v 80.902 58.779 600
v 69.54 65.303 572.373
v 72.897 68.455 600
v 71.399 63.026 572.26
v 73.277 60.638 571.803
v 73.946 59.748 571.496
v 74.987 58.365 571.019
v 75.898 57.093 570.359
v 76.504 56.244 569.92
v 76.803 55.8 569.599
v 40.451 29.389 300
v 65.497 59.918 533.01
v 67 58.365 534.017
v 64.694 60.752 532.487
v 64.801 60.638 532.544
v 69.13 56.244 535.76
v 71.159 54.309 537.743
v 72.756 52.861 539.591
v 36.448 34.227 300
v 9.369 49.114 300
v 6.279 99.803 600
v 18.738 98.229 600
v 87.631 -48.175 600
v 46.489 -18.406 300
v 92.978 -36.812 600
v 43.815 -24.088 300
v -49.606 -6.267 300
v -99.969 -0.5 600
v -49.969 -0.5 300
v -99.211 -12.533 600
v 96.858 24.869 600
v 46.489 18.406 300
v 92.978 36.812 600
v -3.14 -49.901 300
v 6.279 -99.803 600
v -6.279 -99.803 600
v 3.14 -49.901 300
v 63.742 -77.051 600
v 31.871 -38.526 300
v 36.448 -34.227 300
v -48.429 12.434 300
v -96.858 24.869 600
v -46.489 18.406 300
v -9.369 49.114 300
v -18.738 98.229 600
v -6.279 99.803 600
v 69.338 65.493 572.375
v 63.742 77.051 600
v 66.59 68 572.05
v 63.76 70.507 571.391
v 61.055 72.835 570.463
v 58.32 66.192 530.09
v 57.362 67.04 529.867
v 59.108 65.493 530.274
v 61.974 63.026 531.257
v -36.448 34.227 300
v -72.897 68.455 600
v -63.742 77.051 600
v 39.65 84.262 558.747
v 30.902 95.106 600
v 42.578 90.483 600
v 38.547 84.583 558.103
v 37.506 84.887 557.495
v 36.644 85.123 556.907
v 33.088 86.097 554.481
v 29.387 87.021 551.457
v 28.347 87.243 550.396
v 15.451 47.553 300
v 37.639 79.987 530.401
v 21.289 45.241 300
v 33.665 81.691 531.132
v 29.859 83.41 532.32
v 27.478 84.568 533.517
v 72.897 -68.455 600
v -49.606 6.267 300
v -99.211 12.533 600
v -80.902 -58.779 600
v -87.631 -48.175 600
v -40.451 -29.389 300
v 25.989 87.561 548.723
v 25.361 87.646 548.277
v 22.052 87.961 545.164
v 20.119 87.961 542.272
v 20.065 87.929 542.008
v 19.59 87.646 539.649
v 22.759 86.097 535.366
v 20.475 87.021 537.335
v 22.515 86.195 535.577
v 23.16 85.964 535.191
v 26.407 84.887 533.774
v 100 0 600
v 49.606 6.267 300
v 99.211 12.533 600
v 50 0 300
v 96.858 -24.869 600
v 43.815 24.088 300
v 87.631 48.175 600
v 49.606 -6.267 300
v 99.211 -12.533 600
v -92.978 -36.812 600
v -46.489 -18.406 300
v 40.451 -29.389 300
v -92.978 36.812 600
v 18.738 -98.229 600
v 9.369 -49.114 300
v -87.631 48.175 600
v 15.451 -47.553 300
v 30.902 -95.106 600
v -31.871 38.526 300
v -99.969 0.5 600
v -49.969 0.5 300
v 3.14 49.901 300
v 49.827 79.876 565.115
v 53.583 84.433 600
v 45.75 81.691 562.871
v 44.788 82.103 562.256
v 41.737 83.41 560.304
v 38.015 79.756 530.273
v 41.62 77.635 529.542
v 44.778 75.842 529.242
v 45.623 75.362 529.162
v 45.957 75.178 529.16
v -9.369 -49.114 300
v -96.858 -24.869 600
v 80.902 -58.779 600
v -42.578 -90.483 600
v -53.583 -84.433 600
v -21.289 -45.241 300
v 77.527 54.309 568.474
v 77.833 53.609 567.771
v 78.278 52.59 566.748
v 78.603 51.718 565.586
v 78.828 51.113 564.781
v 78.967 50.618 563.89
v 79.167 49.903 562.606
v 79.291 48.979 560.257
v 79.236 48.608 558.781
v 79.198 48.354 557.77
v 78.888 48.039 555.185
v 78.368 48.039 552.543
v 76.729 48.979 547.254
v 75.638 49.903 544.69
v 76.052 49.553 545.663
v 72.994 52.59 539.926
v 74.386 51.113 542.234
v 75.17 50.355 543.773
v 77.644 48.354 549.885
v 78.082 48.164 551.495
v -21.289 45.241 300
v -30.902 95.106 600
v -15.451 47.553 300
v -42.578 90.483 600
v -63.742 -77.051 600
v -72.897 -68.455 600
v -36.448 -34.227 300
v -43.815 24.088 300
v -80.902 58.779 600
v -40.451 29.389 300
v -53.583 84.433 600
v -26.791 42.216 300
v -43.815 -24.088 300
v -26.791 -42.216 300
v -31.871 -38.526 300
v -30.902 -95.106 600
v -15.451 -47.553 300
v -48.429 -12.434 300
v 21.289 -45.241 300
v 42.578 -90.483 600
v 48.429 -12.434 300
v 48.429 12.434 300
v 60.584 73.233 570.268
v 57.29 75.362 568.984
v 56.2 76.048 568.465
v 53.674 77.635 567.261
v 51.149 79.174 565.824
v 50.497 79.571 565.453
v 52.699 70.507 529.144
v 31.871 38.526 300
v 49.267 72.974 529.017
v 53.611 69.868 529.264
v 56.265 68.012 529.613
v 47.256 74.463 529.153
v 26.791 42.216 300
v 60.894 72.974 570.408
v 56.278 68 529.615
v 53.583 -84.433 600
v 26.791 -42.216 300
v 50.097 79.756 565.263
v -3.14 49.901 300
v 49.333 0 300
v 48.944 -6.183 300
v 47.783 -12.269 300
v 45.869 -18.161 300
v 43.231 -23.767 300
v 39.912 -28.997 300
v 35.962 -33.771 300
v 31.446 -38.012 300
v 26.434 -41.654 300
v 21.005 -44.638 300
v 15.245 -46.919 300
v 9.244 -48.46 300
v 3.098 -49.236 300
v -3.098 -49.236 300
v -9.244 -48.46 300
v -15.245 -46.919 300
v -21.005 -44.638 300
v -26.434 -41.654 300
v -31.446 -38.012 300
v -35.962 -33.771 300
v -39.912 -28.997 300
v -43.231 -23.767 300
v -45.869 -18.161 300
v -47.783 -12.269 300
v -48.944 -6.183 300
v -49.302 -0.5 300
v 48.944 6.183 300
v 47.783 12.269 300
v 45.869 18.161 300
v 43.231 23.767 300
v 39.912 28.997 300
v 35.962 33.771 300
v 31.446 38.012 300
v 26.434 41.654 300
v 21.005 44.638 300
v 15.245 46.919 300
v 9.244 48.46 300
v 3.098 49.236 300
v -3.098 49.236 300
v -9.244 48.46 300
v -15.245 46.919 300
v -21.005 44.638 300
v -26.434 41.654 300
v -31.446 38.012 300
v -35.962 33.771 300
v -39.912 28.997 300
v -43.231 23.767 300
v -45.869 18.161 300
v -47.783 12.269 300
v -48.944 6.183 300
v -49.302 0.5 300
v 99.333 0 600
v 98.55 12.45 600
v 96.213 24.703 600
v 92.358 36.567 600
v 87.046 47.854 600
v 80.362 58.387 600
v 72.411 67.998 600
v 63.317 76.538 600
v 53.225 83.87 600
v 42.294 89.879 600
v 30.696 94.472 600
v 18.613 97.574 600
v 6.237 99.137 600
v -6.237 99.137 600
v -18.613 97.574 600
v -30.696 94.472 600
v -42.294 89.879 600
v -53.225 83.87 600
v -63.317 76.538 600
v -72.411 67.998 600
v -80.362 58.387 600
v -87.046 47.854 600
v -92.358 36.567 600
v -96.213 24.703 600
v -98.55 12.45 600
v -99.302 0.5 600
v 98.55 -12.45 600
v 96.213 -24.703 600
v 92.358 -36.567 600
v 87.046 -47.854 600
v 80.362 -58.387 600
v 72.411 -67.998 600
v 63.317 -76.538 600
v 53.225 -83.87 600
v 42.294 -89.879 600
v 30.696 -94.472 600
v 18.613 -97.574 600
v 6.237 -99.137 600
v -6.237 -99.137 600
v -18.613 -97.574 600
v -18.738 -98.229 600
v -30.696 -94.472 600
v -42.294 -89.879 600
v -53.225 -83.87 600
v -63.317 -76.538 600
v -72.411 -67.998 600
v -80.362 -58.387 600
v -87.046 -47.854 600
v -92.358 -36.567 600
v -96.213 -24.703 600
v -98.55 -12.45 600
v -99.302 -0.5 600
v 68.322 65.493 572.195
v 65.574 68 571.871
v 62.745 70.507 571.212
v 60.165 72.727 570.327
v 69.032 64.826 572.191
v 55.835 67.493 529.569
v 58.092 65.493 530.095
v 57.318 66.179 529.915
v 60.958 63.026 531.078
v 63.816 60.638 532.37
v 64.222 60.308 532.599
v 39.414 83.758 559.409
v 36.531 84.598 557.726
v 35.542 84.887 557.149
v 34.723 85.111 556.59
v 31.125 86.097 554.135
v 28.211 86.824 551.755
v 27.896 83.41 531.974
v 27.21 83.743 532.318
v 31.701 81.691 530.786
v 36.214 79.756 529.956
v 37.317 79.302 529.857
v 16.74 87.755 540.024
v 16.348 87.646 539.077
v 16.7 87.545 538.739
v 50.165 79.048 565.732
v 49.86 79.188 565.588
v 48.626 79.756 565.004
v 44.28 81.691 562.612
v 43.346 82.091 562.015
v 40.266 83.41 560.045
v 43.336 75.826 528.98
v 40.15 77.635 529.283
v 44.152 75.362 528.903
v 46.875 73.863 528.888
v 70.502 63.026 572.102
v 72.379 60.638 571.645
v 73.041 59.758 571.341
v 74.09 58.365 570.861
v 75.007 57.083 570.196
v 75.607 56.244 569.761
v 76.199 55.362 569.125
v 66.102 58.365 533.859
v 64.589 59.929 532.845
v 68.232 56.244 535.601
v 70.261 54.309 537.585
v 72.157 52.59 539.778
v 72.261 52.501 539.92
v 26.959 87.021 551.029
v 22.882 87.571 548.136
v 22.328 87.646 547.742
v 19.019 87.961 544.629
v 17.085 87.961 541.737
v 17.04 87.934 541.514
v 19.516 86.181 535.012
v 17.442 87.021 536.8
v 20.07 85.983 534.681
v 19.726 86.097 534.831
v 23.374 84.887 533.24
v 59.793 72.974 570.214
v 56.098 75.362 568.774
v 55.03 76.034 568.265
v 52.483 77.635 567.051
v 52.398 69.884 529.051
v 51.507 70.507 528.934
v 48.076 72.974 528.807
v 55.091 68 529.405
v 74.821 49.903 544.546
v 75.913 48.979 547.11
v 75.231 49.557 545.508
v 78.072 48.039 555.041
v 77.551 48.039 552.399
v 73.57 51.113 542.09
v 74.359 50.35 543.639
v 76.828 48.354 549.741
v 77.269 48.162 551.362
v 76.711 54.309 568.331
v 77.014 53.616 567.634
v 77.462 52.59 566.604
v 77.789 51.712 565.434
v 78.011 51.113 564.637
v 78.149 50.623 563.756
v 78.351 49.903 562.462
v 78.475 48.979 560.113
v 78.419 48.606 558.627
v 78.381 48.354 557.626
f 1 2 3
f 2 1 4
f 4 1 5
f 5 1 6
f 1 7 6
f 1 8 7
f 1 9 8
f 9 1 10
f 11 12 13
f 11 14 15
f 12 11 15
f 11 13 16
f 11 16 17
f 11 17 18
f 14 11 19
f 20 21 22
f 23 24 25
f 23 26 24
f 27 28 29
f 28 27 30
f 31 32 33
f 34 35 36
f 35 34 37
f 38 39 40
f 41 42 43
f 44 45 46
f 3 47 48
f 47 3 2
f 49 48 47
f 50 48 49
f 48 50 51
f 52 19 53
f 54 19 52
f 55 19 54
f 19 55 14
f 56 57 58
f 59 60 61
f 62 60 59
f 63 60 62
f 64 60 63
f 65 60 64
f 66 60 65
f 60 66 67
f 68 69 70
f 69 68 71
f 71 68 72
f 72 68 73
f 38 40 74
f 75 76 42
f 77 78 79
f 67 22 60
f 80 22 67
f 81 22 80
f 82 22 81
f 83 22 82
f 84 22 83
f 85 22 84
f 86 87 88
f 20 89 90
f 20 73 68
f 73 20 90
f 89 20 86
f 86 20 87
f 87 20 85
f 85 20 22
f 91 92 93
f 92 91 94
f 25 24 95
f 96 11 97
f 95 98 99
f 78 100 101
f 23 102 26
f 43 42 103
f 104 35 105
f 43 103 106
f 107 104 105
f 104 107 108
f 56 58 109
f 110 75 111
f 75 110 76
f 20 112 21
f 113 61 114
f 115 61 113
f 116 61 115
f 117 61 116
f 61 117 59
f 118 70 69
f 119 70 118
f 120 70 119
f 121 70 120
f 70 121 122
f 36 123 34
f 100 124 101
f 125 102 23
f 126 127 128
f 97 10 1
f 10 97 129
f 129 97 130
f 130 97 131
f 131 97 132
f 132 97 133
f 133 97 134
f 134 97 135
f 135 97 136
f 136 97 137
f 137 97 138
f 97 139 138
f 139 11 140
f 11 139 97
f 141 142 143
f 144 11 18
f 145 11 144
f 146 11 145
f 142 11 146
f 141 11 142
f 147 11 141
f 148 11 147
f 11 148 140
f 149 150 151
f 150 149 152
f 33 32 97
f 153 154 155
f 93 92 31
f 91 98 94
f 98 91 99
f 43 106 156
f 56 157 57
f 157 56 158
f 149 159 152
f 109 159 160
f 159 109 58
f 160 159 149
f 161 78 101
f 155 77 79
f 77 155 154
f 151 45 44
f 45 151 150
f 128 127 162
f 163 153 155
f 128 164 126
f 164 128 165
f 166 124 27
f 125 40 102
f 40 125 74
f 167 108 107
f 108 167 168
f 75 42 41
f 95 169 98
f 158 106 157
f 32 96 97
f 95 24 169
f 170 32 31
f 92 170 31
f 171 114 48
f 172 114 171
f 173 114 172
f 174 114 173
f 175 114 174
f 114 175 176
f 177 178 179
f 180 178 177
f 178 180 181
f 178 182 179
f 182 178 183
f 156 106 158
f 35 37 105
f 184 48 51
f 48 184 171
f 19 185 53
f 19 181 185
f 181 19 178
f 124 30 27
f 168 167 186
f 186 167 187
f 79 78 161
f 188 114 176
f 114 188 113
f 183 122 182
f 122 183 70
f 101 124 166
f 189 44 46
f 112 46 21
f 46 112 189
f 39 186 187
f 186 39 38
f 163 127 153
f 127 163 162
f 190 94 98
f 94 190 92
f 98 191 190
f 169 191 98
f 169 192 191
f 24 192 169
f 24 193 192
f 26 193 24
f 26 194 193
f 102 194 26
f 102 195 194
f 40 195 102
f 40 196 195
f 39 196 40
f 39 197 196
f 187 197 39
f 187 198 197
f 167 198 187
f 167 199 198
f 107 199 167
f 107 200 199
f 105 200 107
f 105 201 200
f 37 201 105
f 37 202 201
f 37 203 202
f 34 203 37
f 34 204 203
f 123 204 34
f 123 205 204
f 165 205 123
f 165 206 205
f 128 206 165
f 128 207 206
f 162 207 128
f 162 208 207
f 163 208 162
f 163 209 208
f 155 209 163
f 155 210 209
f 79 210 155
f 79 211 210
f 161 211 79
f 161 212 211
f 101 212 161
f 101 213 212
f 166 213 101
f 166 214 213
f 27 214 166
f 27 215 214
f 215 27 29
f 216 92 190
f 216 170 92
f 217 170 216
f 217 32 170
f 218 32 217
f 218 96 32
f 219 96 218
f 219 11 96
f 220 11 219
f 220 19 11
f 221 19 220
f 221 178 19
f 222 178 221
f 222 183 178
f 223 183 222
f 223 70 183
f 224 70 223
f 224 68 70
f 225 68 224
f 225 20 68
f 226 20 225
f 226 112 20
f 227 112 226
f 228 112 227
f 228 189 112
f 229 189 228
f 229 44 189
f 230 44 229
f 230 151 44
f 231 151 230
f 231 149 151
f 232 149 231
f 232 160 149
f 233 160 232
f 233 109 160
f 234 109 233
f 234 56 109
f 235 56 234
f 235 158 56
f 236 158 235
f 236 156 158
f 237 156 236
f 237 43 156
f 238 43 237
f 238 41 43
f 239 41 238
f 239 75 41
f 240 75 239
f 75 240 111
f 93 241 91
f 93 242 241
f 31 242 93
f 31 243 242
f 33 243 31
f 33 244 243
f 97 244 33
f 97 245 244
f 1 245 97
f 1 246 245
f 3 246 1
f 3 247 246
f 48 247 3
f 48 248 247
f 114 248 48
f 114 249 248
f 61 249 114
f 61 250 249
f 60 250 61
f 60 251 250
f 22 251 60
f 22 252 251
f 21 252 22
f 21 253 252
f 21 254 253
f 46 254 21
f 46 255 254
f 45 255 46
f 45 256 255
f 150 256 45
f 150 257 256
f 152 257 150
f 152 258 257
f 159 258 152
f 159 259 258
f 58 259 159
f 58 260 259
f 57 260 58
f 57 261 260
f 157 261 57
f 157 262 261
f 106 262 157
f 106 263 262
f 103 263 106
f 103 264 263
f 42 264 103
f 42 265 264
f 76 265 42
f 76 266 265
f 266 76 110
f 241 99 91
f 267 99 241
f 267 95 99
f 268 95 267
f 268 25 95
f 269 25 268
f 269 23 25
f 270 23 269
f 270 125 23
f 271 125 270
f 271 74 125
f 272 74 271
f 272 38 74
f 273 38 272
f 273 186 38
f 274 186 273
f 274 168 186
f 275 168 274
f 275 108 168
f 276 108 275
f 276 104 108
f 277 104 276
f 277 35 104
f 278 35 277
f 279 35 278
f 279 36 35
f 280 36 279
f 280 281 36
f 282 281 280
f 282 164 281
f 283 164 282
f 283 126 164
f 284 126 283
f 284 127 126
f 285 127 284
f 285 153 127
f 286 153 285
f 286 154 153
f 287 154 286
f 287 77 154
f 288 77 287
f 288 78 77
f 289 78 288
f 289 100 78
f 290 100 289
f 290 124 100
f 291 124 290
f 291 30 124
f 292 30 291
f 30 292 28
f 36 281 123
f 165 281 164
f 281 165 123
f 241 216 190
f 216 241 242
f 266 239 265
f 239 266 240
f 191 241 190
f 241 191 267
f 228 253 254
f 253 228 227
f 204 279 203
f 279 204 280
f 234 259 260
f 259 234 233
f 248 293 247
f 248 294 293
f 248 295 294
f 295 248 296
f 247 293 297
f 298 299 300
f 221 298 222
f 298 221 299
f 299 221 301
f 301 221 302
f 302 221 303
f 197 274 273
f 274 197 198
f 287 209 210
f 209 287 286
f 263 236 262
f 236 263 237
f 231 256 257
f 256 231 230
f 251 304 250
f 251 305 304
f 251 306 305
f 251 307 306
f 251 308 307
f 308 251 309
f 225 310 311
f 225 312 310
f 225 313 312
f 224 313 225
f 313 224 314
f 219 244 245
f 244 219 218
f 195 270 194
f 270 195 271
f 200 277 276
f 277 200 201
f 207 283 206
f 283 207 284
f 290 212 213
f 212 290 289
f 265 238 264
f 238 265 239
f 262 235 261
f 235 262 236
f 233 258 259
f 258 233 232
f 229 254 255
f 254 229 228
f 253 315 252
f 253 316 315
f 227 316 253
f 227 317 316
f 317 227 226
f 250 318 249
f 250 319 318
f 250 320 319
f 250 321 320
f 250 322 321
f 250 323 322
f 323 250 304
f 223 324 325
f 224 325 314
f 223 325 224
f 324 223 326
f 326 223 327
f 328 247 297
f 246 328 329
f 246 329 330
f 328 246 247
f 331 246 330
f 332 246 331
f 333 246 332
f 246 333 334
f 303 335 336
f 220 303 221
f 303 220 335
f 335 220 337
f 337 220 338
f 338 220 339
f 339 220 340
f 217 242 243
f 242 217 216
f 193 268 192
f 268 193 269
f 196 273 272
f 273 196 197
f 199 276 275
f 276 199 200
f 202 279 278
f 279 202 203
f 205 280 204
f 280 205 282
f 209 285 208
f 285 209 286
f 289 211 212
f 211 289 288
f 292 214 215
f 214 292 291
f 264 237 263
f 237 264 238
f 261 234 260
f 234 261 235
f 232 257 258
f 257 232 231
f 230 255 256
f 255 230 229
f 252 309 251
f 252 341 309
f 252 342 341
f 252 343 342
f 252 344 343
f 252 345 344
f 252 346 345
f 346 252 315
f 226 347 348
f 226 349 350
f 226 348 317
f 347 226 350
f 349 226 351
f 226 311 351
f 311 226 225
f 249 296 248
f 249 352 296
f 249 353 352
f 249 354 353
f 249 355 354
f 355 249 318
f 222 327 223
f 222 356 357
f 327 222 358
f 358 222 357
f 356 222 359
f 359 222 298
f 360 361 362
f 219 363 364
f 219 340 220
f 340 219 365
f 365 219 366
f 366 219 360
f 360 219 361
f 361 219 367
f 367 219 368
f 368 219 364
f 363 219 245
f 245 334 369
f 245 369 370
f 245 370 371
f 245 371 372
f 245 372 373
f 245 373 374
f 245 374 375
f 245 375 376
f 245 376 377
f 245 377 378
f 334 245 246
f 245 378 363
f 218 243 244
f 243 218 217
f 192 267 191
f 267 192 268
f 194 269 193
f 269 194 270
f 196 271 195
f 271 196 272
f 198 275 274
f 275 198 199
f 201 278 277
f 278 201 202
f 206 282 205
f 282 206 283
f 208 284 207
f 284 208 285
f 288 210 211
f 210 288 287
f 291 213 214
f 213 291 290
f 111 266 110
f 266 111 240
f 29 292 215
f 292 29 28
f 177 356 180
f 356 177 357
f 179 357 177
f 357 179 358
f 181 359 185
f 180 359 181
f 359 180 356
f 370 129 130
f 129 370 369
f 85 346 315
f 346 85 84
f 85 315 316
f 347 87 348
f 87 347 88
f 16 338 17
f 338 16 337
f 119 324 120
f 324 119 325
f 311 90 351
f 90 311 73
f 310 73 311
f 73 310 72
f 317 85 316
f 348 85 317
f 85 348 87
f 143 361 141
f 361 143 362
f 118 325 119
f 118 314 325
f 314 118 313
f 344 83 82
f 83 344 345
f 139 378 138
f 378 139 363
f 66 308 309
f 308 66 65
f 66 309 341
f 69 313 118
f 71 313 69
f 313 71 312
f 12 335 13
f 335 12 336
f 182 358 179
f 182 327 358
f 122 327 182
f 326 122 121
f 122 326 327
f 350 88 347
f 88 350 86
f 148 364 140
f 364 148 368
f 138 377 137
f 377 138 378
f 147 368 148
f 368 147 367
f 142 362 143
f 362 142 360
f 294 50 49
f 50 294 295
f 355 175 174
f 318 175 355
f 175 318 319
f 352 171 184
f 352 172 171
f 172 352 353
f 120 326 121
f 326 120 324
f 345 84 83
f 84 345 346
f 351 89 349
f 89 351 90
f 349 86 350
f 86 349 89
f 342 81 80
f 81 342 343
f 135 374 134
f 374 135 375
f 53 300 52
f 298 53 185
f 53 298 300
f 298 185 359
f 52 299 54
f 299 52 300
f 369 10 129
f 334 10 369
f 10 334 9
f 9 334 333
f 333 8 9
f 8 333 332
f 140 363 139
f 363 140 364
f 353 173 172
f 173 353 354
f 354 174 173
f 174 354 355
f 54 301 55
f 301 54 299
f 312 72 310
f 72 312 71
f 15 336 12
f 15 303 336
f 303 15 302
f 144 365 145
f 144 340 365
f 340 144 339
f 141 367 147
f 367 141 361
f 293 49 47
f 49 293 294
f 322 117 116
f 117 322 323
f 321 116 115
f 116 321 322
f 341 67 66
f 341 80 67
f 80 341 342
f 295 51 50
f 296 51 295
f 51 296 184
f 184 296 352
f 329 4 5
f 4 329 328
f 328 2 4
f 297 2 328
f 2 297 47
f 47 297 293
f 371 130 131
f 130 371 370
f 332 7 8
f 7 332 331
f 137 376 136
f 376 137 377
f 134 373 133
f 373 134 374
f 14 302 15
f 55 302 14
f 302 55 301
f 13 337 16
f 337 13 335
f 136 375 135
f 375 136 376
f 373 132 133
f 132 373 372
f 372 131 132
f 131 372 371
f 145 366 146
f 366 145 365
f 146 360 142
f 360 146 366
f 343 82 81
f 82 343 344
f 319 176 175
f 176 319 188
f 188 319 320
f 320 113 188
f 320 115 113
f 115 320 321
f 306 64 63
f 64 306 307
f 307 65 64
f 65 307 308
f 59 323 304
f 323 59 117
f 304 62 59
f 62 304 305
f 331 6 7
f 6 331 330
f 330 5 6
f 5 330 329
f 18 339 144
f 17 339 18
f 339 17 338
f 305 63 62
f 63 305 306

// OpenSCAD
/* -*- mode: scad; c-basic-offset: 4; c-file-style: "k&r"; indent-tabs-mode: nil -*- */
/* All measurements are in milimeters */

top_diameter=200;
bottom_diameter=100;
height=300;
inlet_diameter = 40;

/* internal variables */
$fn=50;
inlet_radius  =  inlet_diameter / 2;
top_radius    =    top_diameter / 2;
bottom_radius = bottom_diameter / 2;
tga           = (top_radius - bottom_radius) / height;
total_height  = top_radius / tga;
bottom_height = total_height - height;

/* inlet position */
inlet_vertical_position = total_height-inlet_diameter * 1.5 ;
inlet_horizontal_position = inlet_vertical_position * tga - inlet_radius*1.1;
inlet_position = [0,inlet_horizontal_position,inlet_vertical_position];
inlet_angle = 80;

difference() {
    /* the cyclone */
    translate([0,0,bottom_height])
        cylinder(r1=bottom_radius, r2=top_radius, h=height);
    /* remove the inside */
    translate([0,0,4])
        cylinder(r1=0, r2=top_radius, h=total_height);
    /* cut in half at y = 0 and x > 0 */
    rotate([0,0,0])
	translate([-top_radius - 10,-0.5,-10])
        cube([top_radius + 10,1,total_height+20]);
    /* the inlet */
    translate(inlet_position)
	rotate([0,inlet_angle,0])
        cylinder(r=inlet_radius, h=top_diameter);
}
